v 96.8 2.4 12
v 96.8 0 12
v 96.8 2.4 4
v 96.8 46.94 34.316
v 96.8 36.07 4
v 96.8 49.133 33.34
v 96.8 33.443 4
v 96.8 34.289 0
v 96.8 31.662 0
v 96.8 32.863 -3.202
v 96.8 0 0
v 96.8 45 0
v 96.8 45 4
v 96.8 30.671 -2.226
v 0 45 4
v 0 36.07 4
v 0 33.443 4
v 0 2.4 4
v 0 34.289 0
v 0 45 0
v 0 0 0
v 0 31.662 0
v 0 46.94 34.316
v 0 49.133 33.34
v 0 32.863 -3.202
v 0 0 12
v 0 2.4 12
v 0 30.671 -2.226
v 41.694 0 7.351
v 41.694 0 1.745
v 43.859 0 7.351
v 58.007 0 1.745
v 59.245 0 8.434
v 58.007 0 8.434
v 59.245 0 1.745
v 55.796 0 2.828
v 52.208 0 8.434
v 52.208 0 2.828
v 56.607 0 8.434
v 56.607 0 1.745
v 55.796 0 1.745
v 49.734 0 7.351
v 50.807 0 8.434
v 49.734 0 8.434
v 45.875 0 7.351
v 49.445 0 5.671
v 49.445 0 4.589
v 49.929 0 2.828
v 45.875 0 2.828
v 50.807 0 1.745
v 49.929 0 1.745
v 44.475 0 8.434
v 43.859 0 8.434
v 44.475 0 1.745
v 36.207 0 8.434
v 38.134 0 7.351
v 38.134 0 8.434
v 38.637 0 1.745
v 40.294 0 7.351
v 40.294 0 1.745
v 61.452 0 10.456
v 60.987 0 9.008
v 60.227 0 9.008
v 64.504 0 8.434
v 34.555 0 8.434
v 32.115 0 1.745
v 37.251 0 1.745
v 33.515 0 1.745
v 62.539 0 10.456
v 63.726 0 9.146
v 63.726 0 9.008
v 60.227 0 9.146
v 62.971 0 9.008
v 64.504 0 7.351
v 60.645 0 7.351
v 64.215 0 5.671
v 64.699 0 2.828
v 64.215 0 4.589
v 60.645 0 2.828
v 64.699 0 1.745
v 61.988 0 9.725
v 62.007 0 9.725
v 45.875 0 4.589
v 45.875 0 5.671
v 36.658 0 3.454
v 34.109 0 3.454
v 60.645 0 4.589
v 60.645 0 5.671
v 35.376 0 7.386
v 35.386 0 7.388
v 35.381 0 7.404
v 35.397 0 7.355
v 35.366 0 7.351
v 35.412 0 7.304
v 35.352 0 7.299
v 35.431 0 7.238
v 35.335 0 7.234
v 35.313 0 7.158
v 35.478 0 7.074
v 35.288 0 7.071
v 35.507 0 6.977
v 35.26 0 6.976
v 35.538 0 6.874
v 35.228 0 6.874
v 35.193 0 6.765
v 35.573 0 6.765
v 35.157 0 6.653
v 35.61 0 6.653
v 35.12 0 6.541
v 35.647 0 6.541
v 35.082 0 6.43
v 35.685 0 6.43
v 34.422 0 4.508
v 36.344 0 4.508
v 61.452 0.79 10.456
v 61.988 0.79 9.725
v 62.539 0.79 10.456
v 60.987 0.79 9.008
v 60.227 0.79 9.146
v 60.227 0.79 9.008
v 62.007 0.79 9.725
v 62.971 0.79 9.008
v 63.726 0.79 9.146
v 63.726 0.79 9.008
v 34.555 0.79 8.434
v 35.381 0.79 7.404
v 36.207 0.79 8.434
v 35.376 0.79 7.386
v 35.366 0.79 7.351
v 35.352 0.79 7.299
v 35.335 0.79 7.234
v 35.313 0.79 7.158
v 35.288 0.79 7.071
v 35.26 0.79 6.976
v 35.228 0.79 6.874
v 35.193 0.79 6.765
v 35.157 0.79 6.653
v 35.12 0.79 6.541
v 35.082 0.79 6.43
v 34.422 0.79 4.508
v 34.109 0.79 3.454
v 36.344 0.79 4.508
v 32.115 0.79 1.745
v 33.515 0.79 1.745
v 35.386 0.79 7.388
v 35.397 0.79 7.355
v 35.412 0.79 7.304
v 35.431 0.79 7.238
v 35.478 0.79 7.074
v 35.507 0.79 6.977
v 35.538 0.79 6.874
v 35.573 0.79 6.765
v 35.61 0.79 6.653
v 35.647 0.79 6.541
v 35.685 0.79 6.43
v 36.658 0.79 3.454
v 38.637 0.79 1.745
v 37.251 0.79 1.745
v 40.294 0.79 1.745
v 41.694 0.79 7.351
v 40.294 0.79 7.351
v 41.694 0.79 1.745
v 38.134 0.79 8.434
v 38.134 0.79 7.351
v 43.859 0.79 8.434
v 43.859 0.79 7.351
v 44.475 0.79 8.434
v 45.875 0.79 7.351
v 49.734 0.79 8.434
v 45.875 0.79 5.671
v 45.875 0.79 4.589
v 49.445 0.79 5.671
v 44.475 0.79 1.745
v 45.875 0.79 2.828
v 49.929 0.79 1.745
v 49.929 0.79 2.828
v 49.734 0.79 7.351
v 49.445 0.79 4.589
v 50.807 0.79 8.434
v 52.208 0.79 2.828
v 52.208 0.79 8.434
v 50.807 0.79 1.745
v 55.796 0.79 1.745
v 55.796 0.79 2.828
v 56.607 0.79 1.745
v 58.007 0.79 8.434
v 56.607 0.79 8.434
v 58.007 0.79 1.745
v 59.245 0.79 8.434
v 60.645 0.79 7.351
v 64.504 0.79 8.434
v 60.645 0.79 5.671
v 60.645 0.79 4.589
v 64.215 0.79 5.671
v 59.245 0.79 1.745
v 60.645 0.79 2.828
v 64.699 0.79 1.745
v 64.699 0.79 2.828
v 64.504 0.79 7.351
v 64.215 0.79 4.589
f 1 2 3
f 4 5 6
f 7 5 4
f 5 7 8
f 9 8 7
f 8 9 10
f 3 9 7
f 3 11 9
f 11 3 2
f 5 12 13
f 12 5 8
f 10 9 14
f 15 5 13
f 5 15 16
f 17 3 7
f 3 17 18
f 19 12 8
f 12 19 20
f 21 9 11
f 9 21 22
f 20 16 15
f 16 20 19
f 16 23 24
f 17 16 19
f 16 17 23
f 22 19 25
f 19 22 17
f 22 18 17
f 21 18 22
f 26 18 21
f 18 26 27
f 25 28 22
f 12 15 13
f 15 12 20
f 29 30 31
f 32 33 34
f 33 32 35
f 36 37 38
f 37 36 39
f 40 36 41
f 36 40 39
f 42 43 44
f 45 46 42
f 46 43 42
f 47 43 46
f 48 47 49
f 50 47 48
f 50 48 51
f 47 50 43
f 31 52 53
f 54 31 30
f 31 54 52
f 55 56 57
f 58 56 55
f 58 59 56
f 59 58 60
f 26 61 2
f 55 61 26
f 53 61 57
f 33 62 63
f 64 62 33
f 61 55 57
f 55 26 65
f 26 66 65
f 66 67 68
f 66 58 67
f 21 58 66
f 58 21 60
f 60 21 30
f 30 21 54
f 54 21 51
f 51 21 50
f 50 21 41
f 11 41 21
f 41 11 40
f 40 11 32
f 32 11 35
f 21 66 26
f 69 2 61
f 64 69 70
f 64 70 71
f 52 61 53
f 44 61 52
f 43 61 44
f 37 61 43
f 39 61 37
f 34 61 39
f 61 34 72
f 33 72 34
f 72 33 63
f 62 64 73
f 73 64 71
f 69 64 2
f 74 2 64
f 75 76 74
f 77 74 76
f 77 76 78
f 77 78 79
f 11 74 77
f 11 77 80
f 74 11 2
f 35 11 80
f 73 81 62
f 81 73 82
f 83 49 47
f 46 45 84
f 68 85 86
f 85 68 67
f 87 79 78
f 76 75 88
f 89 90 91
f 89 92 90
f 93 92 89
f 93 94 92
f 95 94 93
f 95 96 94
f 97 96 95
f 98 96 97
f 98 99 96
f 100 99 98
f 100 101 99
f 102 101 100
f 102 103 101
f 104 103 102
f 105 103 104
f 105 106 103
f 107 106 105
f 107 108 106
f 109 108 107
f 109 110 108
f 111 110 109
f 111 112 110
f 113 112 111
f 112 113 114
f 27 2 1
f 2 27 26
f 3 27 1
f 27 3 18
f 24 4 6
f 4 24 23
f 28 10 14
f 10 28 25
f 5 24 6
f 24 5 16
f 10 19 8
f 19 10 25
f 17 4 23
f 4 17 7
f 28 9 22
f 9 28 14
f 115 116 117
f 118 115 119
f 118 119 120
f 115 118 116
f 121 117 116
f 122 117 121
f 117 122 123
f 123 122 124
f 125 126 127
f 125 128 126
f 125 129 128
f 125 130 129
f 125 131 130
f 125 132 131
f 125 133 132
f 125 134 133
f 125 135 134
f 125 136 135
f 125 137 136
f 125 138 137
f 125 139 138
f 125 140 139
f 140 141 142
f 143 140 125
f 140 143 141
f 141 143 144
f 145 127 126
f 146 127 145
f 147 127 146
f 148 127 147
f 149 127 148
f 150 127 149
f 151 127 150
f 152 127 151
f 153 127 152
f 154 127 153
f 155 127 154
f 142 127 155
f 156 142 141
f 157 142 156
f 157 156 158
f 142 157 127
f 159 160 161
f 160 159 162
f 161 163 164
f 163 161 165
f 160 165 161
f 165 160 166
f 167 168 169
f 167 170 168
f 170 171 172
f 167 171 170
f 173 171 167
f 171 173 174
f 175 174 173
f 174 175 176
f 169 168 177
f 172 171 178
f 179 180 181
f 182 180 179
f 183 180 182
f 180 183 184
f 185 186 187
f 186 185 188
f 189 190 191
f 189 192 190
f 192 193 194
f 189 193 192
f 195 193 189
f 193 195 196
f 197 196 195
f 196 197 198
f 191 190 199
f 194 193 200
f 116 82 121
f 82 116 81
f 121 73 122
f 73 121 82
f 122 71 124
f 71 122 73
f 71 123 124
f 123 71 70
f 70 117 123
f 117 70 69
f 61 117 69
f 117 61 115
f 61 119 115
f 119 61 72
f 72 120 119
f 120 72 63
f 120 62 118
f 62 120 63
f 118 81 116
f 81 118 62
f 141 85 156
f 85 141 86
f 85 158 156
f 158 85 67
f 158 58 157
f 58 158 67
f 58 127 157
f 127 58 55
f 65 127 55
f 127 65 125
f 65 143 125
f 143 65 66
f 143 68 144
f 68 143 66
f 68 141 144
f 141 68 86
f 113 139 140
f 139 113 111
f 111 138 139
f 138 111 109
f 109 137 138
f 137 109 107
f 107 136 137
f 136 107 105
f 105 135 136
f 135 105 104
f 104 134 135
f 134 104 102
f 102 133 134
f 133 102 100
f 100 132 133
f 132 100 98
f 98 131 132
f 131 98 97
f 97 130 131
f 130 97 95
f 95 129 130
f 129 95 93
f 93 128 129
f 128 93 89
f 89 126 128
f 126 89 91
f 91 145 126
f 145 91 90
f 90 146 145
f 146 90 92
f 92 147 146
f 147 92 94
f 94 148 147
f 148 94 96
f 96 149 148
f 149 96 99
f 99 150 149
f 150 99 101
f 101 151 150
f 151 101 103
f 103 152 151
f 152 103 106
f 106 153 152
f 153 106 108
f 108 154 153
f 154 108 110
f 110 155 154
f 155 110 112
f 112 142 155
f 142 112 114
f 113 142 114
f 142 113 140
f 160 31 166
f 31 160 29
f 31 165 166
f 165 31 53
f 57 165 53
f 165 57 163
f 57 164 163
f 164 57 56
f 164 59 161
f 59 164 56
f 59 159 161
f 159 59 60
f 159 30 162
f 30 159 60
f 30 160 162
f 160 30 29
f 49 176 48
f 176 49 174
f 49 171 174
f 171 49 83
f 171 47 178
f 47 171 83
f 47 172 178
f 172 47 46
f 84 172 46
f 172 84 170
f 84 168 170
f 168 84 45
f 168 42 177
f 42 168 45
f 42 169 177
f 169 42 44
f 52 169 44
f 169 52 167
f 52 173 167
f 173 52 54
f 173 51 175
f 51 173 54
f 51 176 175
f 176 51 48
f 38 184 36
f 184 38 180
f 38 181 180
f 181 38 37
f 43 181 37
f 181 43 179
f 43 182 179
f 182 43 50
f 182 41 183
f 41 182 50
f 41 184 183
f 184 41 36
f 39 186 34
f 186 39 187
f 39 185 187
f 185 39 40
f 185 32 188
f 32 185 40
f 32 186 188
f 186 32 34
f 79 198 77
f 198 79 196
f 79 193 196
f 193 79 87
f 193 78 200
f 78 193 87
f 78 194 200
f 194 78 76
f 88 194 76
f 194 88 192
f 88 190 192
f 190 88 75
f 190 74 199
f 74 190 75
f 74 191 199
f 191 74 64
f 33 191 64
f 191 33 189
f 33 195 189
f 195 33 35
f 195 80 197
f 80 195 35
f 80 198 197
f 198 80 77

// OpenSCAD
// Porta-cartão de mesa - impressão 3D
card_w = 90;         // largura do cartão (mm)
card_h = 50;         // altura do cartão (mm)
stack = 12;          // espessura da pilha de cartões (mm)
wall = 2.4;          // espessura das paredes (mm)
clearance = 1;       // folga para os cartões (mm)
tilt = 12;           // inclinação do encosto (graus)
base_d = 45;         // profundidade da base (mm)
base_h = 4;          // altura da base (mm)
lip_h = 12;          // altura da aba da frente (mm)
back_h = 40;         // altura do encosto (mm)
word = "ATELIÊ";     // texto gravado
font_size = 7;       // altura da letra (mm)
engrave = 0.8;       // profundidade da gravação (mm)

body_w = card_w + 2 * clearance + 2 * wall;
pocket = stack + clearance;

difference() {
    union() {
        cube([body_w, base_d, base_h]);
        cube([body_w, wall, lip_h]);
        translate([0, wall + pocket + wall, 0])
            rotate([-tilt, 0, 0])
                translate([0, -wall, 0])
        translate([0, wall + pocket + wall, 0])
            rotate([-tilt, 0, 0])
                translate([0, -wall, 0])
                    cube([body_w, wall, back_h]);
    }
    translate([body_w / 2, -0.01, lip_h / 2])
        rotate([90, 0, 0])
            translate([0, 0, -engrave])
                linear_extrude(engrave + 0.01)
                    text(word, size = font_size, font = "Liberation Sans:style=Bold",
                         halign = "center", valign = "center");
}

echo(str("Largura: ", body_w, " mm"));
echo(str("Profundidade: ", base_d, " mm"));
echo(str("Altura: ", back_h * cos(tilt), " mm"));
